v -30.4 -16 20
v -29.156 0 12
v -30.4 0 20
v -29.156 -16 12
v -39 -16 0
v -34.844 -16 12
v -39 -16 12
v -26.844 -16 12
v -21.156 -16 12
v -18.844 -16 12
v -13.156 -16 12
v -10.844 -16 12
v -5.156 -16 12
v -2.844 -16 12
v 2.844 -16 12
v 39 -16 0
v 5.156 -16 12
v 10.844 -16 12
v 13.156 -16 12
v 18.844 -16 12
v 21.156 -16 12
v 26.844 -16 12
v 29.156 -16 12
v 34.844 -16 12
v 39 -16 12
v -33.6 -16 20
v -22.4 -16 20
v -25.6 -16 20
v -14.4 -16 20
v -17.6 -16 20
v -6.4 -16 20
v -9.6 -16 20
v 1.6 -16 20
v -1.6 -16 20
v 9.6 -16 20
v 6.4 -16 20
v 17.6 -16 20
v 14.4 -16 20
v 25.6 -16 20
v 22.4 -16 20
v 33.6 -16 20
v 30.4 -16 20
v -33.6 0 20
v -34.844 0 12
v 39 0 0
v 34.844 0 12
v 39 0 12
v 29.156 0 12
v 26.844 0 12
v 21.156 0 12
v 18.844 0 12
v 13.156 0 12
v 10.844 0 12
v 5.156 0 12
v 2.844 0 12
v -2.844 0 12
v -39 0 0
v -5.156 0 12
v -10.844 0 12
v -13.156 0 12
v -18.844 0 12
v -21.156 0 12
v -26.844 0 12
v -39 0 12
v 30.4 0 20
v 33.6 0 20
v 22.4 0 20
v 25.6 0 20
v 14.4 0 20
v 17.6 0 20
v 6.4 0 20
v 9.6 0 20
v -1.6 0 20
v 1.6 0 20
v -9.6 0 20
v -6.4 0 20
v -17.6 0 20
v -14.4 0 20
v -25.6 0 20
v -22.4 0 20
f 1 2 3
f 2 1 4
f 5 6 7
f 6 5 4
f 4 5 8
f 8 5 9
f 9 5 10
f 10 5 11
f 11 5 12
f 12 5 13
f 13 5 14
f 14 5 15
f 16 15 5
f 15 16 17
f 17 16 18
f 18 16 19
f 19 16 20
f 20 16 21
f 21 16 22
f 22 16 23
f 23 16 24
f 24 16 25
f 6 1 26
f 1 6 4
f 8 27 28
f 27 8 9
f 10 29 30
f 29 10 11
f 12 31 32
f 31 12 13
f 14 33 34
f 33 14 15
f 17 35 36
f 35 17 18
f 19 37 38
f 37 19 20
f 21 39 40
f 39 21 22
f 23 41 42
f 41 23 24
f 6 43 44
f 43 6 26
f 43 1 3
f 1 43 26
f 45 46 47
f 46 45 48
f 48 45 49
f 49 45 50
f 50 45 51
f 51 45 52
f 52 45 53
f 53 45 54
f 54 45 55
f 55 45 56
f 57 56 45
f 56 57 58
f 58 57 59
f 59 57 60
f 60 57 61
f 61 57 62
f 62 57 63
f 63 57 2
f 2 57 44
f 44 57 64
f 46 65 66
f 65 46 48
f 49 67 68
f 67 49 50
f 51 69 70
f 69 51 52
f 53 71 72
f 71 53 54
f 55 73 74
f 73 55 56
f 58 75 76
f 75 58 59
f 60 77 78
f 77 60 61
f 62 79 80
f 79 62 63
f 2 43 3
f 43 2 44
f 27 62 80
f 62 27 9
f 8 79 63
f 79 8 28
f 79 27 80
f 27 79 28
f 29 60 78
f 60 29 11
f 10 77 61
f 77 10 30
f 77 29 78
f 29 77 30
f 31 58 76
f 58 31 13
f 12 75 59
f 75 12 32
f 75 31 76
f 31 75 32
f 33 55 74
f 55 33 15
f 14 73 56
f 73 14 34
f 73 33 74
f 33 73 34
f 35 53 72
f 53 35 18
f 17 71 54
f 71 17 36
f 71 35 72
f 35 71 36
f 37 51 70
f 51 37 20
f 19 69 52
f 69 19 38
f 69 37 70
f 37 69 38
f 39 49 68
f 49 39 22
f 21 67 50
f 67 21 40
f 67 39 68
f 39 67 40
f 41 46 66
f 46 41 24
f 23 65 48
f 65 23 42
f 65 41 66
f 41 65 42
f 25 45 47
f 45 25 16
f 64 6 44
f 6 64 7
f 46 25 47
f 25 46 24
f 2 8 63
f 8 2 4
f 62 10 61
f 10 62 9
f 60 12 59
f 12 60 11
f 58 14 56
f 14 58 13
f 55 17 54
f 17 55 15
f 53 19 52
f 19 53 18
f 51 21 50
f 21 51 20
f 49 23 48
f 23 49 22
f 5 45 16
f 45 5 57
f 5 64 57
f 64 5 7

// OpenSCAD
$fn = 32;

// ----------------------------------------------------------------------
// Toothed rack, 9 teeth
// 8 mm pitch, 8 mm teeth
// ----------------------------------------------------------------------

// --- parameters (mm) ---
bar_w = 16;     // bar width (Y)
bar_h = 12;     // bar height (Z)
teeth = 9;      // number of teeth
pitch = 8;      // tooth pitch
tooth_h = 8;    // tooth height above the bar
root_w = 6;     // tooth width at the root
crest_w = 3.2;  // tooth width at the crest

// --- derived feature positions (mm) ---
span = (teeth - 1) * pitch;  // = 64   distance between the outer teeth
bar_l = span + root_w + 8;   // = 78   bar length: teeth plus 4 mm at each end
tooth_x = -span / 2;         // = -32   X of the first tooth
height = bar_h + tooth_h;    // = 20   overall height
feature_centers = [
  [tooth_x + 0 * pitch, -bar_w / 2],
  [tooth_x + 1 * pitch, -bar_w / 2],
  [tooth_x + 2 * pitch, -bar_w / 2],
  [tooth_x + 3 * pitch, -bar_w / 2],
  [tooth_x + 4 * pitch, -bar_w / 2],
  [tooth_x + 5 * pitch, -bar_w / 2],
  [tooth_x + 6 * pitch, -bar_w / 2],
  [tooth_x + 7 * pitch, -bar_w / 2],
  [tooth_x + 8 * pitch, -bar_w / 2]
];   // tooth centre line, drives the tooth loop

// bar with a rack of teeth, one extruded trapezoium per centre
module rack_tooth() {
  linear_extrude(height = bar_w)
    polygon(points = [
      [0, 0],
      [root_w, 0],
      [root_w / 2 + crest_w / 2, tooth_h + 1],
      [root_w / 2 - crest_w / 2, tooth_h + 1]
    ]);
}

union() {
  translate([-bar_l / 2, -bar_w, 0]) cube([bar_l, bar_w, bar_h]);
  for (centre = feature_centers)
    translate([centre[0] - root_w / 2, 0, bar_h - 1]) rotate([90, 0, 0]) rack_tooth();
}
